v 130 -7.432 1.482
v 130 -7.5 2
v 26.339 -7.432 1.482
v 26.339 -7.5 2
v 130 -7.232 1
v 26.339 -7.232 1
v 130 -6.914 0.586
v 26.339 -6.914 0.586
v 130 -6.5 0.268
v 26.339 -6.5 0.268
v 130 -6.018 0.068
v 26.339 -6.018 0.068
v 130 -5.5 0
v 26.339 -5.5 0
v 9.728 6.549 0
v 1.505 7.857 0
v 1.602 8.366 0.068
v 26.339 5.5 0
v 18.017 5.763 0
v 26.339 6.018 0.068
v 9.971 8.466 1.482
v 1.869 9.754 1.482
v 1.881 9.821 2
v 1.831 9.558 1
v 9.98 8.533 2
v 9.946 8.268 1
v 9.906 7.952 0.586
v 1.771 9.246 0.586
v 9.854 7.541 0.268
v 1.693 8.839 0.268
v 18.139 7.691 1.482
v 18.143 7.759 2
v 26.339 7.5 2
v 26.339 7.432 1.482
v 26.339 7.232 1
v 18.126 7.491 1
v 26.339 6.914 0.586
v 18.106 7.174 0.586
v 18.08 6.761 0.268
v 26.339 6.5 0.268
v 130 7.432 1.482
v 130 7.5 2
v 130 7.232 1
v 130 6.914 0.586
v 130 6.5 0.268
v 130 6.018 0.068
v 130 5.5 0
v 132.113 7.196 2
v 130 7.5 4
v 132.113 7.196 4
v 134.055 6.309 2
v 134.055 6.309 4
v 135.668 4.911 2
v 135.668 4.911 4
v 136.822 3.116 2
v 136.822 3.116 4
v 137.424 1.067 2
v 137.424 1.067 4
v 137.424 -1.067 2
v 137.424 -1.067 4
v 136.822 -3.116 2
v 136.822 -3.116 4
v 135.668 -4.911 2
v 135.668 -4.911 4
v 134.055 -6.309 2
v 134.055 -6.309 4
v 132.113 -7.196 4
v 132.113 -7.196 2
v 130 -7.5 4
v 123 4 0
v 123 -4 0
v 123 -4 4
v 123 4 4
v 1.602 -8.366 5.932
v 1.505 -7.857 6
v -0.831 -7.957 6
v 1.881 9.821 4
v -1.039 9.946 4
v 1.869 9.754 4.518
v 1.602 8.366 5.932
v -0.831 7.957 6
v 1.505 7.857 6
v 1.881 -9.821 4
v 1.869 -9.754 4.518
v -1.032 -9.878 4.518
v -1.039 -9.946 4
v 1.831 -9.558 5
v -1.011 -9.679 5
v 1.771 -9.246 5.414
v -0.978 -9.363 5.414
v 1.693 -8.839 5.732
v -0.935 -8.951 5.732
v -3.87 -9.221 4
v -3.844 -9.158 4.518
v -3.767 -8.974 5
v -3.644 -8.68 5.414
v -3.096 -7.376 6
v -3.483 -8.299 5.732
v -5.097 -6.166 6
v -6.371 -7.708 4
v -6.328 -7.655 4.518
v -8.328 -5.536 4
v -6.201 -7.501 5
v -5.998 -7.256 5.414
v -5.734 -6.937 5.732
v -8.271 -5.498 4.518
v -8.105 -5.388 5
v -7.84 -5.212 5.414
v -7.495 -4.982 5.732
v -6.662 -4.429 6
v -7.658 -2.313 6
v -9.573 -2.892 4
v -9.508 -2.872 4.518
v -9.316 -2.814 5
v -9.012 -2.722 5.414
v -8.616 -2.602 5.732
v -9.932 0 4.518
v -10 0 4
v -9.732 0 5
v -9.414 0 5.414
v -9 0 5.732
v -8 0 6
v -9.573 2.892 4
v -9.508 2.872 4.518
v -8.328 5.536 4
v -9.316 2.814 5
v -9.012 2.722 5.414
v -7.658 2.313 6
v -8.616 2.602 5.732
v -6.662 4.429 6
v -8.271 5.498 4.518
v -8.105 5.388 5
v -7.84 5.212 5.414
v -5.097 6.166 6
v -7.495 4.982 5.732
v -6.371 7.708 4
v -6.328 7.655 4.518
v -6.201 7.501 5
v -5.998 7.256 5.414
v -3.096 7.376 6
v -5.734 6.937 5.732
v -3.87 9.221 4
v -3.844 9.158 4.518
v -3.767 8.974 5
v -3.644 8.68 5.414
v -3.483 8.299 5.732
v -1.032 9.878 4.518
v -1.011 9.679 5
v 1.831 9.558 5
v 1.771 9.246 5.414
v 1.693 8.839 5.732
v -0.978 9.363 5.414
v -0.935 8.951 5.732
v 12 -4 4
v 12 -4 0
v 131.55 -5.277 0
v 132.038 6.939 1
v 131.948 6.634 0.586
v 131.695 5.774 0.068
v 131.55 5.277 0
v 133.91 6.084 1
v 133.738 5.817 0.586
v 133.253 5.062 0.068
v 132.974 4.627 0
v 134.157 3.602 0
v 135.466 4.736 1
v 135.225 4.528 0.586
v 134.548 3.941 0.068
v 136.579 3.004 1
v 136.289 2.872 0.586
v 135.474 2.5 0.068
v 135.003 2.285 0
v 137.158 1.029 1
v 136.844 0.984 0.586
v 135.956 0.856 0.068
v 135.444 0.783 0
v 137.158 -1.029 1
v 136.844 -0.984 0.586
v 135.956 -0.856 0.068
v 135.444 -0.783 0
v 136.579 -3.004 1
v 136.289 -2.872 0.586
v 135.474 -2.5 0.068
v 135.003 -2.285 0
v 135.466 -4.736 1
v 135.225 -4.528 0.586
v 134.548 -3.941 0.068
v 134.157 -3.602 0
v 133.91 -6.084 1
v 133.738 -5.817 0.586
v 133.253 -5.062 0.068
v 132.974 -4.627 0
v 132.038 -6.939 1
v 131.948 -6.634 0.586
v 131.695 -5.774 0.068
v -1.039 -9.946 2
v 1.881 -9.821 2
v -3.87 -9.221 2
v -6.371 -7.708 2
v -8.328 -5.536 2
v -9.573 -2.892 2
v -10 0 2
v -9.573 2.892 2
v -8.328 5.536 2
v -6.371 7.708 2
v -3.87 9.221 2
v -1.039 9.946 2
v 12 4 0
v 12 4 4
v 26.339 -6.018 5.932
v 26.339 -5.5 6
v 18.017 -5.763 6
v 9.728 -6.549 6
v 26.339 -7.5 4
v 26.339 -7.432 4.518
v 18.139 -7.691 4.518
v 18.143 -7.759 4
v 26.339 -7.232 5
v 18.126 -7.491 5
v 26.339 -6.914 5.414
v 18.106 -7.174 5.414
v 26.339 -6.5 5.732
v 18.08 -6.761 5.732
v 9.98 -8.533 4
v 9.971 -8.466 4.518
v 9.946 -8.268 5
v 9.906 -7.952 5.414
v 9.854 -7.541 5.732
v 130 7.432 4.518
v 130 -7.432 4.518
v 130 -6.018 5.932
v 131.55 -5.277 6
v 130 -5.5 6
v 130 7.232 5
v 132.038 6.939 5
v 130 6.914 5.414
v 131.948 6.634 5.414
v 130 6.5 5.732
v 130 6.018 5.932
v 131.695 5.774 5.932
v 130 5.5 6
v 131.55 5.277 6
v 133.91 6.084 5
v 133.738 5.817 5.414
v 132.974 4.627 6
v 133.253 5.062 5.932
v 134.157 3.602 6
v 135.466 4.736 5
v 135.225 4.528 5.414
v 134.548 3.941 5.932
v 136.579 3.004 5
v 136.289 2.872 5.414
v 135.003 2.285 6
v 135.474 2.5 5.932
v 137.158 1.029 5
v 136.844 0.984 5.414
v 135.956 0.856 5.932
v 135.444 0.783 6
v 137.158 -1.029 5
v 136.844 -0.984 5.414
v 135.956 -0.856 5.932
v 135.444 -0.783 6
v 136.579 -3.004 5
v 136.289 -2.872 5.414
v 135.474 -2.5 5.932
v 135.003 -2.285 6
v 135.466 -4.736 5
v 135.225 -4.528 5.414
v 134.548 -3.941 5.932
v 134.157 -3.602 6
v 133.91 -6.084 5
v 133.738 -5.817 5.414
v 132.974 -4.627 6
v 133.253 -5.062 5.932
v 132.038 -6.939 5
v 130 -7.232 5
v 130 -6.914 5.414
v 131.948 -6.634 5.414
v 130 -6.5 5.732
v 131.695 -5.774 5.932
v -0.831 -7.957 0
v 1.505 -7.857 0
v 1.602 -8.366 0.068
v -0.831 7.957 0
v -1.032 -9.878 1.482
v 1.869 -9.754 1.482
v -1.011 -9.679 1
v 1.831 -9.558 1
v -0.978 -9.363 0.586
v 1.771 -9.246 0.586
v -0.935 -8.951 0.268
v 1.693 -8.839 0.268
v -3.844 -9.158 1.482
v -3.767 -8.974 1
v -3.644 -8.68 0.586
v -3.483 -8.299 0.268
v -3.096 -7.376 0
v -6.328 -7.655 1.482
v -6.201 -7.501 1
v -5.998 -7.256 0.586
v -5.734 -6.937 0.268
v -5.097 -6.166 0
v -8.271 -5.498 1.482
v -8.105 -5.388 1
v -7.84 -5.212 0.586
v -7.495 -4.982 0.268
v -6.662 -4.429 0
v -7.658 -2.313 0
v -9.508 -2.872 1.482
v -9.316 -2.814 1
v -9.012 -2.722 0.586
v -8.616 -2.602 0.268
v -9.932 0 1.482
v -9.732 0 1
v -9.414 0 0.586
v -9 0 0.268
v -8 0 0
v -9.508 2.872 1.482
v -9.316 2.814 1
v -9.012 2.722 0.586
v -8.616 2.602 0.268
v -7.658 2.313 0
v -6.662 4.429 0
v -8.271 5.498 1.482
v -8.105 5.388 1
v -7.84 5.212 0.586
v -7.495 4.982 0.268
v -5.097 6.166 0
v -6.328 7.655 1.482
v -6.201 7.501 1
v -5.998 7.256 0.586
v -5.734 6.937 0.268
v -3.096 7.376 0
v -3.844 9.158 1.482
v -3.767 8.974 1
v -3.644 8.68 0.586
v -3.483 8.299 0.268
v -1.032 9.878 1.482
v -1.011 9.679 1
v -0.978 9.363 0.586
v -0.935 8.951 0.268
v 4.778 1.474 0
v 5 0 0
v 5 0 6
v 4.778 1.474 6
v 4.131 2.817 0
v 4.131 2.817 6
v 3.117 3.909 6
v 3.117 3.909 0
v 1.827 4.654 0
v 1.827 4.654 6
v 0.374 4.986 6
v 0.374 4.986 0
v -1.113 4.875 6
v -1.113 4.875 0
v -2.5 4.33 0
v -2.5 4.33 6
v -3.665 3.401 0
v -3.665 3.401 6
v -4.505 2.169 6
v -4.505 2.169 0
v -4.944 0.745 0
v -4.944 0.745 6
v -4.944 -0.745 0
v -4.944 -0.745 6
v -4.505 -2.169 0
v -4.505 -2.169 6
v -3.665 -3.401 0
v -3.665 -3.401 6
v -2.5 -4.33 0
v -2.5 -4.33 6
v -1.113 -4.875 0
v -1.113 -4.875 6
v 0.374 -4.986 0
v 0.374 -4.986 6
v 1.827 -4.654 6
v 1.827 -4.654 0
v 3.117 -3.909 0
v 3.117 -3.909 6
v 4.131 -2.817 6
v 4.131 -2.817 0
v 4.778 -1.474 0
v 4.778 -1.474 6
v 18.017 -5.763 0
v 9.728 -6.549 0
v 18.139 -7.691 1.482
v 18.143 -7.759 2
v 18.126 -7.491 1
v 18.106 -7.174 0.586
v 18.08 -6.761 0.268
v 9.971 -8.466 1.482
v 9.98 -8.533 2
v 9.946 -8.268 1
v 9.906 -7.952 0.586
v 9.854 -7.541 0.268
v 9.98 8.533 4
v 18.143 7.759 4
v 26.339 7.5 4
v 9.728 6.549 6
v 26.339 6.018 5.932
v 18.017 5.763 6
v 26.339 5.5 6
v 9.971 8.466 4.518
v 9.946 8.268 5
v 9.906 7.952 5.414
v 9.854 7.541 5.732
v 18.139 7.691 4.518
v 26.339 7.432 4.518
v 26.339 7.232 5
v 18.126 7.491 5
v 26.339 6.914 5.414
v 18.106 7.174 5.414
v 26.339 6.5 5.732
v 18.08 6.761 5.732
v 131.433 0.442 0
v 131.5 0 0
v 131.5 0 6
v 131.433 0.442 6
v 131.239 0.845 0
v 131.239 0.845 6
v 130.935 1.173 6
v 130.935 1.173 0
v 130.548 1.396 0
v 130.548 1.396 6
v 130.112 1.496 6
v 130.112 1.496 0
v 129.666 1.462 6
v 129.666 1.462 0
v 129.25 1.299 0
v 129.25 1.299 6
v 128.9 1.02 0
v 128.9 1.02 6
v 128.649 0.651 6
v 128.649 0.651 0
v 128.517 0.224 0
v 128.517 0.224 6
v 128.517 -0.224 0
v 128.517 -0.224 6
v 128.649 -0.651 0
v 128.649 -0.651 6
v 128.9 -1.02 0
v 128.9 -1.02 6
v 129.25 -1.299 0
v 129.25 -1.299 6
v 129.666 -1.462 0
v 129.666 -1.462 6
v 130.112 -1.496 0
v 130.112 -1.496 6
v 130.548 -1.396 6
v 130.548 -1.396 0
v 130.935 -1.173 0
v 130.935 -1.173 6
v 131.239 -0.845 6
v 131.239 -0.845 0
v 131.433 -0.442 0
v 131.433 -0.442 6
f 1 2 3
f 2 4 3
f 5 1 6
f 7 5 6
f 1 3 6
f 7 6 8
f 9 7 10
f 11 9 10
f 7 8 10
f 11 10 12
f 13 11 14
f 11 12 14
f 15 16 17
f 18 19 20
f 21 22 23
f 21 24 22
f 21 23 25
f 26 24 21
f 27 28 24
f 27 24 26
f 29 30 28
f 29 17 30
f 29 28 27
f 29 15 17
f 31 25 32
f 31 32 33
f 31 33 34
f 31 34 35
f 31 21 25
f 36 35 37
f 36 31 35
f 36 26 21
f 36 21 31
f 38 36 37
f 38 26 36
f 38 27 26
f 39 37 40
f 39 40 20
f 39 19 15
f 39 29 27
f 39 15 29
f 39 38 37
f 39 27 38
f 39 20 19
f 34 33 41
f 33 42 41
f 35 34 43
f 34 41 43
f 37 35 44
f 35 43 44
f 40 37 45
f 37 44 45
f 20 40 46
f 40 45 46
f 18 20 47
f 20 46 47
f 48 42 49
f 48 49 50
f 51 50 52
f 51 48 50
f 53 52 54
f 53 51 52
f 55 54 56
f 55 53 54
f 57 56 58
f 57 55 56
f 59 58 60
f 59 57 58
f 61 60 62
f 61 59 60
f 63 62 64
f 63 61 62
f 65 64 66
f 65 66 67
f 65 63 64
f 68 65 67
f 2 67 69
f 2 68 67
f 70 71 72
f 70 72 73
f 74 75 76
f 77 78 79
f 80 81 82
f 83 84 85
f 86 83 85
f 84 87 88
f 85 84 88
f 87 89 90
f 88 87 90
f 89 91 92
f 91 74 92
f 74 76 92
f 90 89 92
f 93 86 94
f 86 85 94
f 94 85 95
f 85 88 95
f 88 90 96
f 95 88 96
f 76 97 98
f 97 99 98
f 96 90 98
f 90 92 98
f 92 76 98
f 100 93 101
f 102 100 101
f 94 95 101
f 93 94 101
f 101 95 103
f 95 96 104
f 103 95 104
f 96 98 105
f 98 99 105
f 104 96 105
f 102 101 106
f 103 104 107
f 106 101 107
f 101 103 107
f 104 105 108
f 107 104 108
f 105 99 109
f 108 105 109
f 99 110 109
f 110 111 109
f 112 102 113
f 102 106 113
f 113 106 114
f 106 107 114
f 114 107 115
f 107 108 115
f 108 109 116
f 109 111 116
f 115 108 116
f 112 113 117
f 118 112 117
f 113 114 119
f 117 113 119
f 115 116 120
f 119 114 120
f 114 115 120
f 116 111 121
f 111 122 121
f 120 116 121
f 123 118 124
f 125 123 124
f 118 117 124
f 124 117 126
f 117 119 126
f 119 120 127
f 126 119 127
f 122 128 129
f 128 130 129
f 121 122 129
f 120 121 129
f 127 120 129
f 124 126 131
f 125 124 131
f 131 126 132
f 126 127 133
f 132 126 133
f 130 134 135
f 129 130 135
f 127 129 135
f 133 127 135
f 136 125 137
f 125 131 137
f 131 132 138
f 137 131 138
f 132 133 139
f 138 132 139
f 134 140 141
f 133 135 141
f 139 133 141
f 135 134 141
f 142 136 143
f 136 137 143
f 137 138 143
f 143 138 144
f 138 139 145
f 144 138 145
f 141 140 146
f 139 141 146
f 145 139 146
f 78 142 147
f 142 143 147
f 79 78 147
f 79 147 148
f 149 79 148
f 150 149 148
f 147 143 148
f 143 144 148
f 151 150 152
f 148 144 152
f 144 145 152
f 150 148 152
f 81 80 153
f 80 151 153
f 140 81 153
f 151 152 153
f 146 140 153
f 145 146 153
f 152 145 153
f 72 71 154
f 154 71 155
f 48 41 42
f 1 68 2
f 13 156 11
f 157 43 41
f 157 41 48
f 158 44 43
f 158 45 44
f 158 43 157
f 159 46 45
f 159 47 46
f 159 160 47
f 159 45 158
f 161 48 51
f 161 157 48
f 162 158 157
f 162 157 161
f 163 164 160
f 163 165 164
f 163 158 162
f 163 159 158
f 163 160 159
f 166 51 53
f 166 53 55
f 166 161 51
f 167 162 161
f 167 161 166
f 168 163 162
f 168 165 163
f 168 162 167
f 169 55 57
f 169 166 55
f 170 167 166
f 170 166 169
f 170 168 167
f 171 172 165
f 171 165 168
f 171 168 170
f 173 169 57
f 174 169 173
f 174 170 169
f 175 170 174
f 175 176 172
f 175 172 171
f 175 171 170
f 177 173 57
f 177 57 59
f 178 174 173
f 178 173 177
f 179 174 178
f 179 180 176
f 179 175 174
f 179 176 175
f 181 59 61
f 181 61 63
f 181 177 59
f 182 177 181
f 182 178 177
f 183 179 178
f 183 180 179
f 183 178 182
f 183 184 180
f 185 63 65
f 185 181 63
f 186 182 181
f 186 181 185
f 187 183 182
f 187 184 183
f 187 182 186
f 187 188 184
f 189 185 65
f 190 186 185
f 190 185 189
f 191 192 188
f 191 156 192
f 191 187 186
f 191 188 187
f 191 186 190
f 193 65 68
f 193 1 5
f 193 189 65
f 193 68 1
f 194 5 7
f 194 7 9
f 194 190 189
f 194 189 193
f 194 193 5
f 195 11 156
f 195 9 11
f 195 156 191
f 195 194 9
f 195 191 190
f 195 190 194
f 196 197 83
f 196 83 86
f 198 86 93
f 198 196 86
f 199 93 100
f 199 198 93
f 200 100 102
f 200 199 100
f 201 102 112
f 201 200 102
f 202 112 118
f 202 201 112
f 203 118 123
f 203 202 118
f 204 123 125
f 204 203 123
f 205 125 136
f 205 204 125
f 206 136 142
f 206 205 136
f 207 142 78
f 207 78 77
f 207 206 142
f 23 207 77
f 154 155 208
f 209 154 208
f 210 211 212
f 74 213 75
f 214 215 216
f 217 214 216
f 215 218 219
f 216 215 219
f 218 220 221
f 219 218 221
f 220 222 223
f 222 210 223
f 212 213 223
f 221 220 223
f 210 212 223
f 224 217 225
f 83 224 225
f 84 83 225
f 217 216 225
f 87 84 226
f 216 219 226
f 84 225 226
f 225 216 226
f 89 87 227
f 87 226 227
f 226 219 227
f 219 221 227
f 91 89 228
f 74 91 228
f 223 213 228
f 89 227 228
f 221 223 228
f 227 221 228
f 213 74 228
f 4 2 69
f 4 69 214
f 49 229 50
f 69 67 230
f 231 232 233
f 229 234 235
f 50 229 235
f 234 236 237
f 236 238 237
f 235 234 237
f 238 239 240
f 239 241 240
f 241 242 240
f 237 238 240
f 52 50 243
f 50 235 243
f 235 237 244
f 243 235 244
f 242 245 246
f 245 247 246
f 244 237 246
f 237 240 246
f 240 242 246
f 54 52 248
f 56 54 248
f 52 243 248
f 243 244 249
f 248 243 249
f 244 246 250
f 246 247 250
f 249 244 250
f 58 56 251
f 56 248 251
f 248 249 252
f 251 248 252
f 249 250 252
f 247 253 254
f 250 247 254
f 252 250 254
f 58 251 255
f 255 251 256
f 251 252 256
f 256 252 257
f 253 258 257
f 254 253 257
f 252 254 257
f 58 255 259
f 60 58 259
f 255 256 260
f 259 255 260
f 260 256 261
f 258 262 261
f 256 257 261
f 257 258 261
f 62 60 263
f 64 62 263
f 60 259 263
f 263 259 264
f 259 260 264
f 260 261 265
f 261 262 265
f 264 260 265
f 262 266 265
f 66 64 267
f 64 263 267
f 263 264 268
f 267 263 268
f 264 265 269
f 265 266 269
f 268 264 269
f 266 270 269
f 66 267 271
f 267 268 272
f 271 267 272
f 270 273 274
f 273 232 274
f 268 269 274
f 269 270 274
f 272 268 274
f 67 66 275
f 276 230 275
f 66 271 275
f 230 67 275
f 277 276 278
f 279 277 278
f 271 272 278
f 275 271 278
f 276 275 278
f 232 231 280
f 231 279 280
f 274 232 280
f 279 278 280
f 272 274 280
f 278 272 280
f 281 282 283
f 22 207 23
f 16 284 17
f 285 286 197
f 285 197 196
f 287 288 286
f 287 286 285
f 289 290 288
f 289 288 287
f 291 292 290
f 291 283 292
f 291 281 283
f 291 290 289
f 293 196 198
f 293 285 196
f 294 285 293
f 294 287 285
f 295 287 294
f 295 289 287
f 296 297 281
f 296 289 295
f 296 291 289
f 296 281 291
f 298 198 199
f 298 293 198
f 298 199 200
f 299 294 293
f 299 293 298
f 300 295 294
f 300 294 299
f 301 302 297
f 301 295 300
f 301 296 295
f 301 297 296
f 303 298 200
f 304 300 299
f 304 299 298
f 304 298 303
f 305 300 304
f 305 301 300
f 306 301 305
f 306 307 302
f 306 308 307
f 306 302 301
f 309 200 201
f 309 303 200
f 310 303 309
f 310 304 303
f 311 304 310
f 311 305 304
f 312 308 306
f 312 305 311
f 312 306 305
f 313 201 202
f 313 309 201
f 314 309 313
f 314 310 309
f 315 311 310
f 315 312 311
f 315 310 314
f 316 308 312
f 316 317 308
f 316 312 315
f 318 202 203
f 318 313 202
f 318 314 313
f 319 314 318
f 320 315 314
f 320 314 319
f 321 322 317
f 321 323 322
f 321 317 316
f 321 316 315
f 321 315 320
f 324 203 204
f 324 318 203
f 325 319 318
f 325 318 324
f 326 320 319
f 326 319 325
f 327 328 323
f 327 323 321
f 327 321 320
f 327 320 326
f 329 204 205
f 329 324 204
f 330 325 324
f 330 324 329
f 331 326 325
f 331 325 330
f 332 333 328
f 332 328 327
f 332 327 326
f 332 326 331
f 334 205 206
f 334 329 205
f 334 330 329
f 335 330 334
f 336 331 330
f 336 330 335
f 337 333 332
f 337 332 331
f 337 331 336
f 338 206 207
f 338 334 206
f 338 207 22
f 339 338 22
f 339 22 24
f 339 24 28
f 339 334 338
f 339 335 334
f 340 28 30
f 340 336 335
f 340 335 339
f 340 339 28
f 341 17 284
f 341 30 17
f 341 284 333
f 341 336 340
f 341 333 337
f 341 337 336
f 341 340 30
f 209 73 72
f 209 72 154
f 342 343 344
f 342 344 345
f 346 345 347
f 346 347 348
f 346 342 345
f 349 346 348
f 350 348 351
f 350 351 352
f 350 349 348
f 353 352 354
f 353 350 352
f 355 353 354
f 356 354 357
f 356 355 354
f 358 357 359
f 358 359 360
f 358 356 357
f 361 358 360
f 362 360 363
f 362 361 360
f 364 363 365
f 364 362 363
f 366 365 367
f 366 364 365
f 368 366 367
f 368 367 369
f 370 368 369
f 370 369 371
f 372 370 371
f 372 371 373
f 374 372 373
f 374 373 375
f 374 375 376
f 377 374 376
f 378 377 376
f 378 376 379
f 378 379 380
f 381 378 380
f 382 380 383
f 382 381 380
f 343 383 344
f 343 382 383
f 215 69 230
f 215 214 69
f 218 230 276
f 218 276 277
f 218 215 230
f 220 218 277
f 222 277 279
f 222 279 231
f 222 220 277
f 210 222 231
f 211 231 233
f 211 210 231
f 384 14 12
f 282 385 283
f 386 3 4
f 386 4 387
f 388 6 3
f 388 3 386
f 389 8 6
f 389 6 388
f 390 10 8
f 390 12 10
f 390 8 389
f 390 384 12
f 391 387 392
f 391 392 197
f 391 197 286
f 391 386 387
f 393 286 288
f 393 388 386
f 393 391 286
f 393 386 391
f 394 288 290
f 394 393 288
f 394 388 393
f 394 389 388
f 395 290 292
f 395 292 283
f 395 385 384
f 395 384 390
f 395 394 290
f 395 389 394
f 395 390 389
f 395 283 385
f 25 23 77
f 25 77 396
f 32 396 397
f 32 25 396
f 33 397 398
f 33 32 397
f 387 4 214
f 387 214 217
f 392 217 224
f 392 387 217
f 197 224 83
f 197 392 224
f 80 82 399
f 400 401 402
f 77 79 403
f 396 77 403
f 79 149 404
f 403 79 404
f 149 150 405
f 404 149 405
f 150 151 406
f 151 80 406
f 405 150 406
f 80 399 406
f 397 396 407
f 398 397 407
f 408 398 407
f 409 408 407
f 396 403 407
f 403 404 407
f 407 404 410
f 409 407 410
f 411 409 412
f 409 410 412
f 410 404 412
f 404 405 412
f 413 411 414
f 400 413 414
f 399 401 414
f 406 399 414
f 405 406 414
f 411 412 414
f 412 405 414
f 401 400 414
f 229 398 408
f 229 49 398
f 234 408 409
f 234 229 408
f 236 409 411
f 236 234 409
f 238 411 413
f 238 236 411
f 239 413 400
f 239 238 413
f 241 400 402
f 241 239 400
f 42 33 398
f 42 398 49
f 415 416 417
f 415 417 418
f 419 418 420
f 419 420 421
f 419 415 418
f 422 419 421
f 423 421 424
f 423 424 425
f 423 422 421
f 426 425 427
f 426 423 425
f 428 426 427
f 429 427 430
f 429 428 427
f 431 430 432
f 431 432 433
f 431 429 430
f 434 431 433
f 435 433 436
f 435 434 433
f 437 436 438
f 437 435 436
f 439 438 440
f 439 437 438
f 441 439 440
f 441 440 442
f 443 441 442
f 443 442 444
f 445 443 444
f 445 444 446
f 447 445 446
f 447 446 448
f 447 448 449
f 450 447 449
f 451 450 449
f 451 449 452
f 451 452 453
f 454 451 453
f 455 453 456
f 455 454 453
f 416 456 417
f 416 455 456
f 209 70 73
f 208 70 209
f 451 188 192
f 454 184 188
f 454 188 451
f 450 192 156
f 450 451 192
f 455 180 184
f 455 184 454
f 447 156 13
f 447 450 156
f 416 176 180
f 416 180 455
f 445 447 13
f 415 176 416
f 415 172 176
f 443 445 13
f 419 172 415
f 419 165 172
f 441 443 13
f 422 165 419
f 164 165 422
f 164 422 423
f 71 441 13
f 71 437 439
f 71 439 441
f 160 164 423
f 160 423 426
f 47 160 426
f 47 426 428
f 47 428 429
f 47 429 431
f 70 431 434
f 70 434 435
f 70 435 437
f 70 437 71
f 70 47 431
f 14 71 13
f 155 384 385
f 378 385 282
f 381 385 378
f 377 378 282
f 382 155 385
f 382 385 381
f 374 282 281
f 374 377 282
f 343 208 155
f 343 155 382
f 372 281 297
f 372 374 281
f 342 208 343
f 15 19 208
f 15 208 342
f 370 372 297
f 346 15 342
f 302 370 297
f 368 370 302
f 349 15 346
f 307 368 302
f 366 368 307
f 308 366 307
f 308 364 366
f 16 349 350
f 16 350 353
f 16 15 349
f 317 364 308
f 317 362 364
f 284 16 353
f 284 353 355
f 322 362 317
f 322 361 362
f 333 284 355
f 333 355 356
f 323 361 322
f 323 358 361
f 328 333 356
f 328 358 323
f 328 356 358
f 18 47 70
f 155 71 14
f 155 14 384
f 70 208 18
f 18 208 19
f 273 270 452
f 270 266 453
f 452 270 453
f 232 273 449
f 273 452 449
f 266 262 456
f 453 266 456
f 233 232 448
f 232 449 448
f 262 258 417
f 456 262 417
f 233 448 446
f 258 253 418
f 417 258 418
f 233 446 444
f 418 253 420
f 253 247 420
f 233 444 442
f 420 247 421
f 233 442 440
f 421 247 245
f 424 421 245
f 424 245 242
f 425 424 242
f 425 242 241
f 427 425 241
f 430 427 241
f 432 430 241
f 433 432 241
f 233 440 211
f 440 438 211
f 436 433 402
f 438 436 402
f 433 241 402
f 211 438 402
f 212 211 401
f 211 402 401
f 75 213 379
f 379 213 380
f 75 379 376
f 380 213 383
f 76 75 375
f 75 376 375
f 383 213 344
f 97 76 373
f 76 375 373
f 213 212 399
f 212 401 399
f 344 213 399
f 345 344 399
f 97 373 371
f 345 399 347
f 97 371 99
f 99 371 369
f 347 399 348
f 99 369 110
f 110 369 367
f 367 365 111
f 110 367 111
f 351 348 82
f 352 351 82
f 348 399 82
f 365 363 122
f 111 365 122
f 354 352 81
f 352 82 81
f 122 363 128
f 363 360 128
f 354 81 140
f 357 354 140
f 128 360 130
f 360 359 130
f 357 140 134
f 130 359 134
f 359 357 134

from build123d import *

# Parameters (mm, degrees)
SKETCH1_R           = 5
SKETCH1_R_2         = 1.5
BOSS_EXTRUDE1_DEPTH = 6
FILLET1_R           = 2
SKETCH2_W           = 111
SKETCH2_H           = 8
CUT_EXTRUDE1_DEPTH  = 4


with BuildPart() as part:
    # Sketch1 → Boss-Extrude1 (new body)
    with BuildSketch(Plane.XY):
        with BuildLine():
            Line((26.339134382, 7.5), (130, 7.5))
            ThreePointArc((130, 7.5), (137.5, 0), (130, -7.5))
            Line((130, -7.5), (26.339134382, -7.5))
            ThreePointArc((26.339134382, -7.5), (14.055289009, -8.081658399), (1.881366742, -9.821428571))
            ThreePointArc((1.881366742, -9.821428571), (-10, 0), (1.881366742, 9.821428571))
            ThreePointArc((1.881366742, 9.821428571), (14.055289009, 8.081658399), (26.339134382, 7.5))
        make_face()
        Circle(SKETCH1_R, mode=Mode.SUBTRACT)
        with Locations((130, 0)):
            Circle(SKETCH1_R_2, mode=Mode.SUBTRACT)
    extrude(amount=BOSS_EXTRUDE1_DEPTH)

    # Fillet1
    fillet1_edges = [part.edges().sort_by_distance(p)[0] for p in [
        (14.055289009, 8.081658399, 6),
        (-10, 0, 6),
        (14.055289009, -8.081658399, 6),
        (78.169567191, -7.5, 6),
        (137.5, 0, 6),
        (78.169567191, -7.5, 0),
        (14.055289009, -8.081658399, 0),
        (-10, 0, 0),
        (78.169567191, 7.5, 6),
        (14.055289009, 8.081658399, 0),
        (78.169567191, 7.5, 0),
        (137.5, 0, 0),
    ]]
    fillet(fillet1_edges, radius=FILLET1_R)

    # Sketch2 → Cut-Extrude1 (cut)
    with BuildSketch(Plane(origin=(0, 0, 0), x_dir=(-1, 0, 0), z_dir=(0, 0, -1))):
        with Locations((-67.5, 0)):
            Rectangle(SKETCH2_W, SKETCH2_H)
    extrude(amount=-CUT_EXTRUDE1_DEPTH, mode=Mode.SUBTRACT)


solid = part.part
